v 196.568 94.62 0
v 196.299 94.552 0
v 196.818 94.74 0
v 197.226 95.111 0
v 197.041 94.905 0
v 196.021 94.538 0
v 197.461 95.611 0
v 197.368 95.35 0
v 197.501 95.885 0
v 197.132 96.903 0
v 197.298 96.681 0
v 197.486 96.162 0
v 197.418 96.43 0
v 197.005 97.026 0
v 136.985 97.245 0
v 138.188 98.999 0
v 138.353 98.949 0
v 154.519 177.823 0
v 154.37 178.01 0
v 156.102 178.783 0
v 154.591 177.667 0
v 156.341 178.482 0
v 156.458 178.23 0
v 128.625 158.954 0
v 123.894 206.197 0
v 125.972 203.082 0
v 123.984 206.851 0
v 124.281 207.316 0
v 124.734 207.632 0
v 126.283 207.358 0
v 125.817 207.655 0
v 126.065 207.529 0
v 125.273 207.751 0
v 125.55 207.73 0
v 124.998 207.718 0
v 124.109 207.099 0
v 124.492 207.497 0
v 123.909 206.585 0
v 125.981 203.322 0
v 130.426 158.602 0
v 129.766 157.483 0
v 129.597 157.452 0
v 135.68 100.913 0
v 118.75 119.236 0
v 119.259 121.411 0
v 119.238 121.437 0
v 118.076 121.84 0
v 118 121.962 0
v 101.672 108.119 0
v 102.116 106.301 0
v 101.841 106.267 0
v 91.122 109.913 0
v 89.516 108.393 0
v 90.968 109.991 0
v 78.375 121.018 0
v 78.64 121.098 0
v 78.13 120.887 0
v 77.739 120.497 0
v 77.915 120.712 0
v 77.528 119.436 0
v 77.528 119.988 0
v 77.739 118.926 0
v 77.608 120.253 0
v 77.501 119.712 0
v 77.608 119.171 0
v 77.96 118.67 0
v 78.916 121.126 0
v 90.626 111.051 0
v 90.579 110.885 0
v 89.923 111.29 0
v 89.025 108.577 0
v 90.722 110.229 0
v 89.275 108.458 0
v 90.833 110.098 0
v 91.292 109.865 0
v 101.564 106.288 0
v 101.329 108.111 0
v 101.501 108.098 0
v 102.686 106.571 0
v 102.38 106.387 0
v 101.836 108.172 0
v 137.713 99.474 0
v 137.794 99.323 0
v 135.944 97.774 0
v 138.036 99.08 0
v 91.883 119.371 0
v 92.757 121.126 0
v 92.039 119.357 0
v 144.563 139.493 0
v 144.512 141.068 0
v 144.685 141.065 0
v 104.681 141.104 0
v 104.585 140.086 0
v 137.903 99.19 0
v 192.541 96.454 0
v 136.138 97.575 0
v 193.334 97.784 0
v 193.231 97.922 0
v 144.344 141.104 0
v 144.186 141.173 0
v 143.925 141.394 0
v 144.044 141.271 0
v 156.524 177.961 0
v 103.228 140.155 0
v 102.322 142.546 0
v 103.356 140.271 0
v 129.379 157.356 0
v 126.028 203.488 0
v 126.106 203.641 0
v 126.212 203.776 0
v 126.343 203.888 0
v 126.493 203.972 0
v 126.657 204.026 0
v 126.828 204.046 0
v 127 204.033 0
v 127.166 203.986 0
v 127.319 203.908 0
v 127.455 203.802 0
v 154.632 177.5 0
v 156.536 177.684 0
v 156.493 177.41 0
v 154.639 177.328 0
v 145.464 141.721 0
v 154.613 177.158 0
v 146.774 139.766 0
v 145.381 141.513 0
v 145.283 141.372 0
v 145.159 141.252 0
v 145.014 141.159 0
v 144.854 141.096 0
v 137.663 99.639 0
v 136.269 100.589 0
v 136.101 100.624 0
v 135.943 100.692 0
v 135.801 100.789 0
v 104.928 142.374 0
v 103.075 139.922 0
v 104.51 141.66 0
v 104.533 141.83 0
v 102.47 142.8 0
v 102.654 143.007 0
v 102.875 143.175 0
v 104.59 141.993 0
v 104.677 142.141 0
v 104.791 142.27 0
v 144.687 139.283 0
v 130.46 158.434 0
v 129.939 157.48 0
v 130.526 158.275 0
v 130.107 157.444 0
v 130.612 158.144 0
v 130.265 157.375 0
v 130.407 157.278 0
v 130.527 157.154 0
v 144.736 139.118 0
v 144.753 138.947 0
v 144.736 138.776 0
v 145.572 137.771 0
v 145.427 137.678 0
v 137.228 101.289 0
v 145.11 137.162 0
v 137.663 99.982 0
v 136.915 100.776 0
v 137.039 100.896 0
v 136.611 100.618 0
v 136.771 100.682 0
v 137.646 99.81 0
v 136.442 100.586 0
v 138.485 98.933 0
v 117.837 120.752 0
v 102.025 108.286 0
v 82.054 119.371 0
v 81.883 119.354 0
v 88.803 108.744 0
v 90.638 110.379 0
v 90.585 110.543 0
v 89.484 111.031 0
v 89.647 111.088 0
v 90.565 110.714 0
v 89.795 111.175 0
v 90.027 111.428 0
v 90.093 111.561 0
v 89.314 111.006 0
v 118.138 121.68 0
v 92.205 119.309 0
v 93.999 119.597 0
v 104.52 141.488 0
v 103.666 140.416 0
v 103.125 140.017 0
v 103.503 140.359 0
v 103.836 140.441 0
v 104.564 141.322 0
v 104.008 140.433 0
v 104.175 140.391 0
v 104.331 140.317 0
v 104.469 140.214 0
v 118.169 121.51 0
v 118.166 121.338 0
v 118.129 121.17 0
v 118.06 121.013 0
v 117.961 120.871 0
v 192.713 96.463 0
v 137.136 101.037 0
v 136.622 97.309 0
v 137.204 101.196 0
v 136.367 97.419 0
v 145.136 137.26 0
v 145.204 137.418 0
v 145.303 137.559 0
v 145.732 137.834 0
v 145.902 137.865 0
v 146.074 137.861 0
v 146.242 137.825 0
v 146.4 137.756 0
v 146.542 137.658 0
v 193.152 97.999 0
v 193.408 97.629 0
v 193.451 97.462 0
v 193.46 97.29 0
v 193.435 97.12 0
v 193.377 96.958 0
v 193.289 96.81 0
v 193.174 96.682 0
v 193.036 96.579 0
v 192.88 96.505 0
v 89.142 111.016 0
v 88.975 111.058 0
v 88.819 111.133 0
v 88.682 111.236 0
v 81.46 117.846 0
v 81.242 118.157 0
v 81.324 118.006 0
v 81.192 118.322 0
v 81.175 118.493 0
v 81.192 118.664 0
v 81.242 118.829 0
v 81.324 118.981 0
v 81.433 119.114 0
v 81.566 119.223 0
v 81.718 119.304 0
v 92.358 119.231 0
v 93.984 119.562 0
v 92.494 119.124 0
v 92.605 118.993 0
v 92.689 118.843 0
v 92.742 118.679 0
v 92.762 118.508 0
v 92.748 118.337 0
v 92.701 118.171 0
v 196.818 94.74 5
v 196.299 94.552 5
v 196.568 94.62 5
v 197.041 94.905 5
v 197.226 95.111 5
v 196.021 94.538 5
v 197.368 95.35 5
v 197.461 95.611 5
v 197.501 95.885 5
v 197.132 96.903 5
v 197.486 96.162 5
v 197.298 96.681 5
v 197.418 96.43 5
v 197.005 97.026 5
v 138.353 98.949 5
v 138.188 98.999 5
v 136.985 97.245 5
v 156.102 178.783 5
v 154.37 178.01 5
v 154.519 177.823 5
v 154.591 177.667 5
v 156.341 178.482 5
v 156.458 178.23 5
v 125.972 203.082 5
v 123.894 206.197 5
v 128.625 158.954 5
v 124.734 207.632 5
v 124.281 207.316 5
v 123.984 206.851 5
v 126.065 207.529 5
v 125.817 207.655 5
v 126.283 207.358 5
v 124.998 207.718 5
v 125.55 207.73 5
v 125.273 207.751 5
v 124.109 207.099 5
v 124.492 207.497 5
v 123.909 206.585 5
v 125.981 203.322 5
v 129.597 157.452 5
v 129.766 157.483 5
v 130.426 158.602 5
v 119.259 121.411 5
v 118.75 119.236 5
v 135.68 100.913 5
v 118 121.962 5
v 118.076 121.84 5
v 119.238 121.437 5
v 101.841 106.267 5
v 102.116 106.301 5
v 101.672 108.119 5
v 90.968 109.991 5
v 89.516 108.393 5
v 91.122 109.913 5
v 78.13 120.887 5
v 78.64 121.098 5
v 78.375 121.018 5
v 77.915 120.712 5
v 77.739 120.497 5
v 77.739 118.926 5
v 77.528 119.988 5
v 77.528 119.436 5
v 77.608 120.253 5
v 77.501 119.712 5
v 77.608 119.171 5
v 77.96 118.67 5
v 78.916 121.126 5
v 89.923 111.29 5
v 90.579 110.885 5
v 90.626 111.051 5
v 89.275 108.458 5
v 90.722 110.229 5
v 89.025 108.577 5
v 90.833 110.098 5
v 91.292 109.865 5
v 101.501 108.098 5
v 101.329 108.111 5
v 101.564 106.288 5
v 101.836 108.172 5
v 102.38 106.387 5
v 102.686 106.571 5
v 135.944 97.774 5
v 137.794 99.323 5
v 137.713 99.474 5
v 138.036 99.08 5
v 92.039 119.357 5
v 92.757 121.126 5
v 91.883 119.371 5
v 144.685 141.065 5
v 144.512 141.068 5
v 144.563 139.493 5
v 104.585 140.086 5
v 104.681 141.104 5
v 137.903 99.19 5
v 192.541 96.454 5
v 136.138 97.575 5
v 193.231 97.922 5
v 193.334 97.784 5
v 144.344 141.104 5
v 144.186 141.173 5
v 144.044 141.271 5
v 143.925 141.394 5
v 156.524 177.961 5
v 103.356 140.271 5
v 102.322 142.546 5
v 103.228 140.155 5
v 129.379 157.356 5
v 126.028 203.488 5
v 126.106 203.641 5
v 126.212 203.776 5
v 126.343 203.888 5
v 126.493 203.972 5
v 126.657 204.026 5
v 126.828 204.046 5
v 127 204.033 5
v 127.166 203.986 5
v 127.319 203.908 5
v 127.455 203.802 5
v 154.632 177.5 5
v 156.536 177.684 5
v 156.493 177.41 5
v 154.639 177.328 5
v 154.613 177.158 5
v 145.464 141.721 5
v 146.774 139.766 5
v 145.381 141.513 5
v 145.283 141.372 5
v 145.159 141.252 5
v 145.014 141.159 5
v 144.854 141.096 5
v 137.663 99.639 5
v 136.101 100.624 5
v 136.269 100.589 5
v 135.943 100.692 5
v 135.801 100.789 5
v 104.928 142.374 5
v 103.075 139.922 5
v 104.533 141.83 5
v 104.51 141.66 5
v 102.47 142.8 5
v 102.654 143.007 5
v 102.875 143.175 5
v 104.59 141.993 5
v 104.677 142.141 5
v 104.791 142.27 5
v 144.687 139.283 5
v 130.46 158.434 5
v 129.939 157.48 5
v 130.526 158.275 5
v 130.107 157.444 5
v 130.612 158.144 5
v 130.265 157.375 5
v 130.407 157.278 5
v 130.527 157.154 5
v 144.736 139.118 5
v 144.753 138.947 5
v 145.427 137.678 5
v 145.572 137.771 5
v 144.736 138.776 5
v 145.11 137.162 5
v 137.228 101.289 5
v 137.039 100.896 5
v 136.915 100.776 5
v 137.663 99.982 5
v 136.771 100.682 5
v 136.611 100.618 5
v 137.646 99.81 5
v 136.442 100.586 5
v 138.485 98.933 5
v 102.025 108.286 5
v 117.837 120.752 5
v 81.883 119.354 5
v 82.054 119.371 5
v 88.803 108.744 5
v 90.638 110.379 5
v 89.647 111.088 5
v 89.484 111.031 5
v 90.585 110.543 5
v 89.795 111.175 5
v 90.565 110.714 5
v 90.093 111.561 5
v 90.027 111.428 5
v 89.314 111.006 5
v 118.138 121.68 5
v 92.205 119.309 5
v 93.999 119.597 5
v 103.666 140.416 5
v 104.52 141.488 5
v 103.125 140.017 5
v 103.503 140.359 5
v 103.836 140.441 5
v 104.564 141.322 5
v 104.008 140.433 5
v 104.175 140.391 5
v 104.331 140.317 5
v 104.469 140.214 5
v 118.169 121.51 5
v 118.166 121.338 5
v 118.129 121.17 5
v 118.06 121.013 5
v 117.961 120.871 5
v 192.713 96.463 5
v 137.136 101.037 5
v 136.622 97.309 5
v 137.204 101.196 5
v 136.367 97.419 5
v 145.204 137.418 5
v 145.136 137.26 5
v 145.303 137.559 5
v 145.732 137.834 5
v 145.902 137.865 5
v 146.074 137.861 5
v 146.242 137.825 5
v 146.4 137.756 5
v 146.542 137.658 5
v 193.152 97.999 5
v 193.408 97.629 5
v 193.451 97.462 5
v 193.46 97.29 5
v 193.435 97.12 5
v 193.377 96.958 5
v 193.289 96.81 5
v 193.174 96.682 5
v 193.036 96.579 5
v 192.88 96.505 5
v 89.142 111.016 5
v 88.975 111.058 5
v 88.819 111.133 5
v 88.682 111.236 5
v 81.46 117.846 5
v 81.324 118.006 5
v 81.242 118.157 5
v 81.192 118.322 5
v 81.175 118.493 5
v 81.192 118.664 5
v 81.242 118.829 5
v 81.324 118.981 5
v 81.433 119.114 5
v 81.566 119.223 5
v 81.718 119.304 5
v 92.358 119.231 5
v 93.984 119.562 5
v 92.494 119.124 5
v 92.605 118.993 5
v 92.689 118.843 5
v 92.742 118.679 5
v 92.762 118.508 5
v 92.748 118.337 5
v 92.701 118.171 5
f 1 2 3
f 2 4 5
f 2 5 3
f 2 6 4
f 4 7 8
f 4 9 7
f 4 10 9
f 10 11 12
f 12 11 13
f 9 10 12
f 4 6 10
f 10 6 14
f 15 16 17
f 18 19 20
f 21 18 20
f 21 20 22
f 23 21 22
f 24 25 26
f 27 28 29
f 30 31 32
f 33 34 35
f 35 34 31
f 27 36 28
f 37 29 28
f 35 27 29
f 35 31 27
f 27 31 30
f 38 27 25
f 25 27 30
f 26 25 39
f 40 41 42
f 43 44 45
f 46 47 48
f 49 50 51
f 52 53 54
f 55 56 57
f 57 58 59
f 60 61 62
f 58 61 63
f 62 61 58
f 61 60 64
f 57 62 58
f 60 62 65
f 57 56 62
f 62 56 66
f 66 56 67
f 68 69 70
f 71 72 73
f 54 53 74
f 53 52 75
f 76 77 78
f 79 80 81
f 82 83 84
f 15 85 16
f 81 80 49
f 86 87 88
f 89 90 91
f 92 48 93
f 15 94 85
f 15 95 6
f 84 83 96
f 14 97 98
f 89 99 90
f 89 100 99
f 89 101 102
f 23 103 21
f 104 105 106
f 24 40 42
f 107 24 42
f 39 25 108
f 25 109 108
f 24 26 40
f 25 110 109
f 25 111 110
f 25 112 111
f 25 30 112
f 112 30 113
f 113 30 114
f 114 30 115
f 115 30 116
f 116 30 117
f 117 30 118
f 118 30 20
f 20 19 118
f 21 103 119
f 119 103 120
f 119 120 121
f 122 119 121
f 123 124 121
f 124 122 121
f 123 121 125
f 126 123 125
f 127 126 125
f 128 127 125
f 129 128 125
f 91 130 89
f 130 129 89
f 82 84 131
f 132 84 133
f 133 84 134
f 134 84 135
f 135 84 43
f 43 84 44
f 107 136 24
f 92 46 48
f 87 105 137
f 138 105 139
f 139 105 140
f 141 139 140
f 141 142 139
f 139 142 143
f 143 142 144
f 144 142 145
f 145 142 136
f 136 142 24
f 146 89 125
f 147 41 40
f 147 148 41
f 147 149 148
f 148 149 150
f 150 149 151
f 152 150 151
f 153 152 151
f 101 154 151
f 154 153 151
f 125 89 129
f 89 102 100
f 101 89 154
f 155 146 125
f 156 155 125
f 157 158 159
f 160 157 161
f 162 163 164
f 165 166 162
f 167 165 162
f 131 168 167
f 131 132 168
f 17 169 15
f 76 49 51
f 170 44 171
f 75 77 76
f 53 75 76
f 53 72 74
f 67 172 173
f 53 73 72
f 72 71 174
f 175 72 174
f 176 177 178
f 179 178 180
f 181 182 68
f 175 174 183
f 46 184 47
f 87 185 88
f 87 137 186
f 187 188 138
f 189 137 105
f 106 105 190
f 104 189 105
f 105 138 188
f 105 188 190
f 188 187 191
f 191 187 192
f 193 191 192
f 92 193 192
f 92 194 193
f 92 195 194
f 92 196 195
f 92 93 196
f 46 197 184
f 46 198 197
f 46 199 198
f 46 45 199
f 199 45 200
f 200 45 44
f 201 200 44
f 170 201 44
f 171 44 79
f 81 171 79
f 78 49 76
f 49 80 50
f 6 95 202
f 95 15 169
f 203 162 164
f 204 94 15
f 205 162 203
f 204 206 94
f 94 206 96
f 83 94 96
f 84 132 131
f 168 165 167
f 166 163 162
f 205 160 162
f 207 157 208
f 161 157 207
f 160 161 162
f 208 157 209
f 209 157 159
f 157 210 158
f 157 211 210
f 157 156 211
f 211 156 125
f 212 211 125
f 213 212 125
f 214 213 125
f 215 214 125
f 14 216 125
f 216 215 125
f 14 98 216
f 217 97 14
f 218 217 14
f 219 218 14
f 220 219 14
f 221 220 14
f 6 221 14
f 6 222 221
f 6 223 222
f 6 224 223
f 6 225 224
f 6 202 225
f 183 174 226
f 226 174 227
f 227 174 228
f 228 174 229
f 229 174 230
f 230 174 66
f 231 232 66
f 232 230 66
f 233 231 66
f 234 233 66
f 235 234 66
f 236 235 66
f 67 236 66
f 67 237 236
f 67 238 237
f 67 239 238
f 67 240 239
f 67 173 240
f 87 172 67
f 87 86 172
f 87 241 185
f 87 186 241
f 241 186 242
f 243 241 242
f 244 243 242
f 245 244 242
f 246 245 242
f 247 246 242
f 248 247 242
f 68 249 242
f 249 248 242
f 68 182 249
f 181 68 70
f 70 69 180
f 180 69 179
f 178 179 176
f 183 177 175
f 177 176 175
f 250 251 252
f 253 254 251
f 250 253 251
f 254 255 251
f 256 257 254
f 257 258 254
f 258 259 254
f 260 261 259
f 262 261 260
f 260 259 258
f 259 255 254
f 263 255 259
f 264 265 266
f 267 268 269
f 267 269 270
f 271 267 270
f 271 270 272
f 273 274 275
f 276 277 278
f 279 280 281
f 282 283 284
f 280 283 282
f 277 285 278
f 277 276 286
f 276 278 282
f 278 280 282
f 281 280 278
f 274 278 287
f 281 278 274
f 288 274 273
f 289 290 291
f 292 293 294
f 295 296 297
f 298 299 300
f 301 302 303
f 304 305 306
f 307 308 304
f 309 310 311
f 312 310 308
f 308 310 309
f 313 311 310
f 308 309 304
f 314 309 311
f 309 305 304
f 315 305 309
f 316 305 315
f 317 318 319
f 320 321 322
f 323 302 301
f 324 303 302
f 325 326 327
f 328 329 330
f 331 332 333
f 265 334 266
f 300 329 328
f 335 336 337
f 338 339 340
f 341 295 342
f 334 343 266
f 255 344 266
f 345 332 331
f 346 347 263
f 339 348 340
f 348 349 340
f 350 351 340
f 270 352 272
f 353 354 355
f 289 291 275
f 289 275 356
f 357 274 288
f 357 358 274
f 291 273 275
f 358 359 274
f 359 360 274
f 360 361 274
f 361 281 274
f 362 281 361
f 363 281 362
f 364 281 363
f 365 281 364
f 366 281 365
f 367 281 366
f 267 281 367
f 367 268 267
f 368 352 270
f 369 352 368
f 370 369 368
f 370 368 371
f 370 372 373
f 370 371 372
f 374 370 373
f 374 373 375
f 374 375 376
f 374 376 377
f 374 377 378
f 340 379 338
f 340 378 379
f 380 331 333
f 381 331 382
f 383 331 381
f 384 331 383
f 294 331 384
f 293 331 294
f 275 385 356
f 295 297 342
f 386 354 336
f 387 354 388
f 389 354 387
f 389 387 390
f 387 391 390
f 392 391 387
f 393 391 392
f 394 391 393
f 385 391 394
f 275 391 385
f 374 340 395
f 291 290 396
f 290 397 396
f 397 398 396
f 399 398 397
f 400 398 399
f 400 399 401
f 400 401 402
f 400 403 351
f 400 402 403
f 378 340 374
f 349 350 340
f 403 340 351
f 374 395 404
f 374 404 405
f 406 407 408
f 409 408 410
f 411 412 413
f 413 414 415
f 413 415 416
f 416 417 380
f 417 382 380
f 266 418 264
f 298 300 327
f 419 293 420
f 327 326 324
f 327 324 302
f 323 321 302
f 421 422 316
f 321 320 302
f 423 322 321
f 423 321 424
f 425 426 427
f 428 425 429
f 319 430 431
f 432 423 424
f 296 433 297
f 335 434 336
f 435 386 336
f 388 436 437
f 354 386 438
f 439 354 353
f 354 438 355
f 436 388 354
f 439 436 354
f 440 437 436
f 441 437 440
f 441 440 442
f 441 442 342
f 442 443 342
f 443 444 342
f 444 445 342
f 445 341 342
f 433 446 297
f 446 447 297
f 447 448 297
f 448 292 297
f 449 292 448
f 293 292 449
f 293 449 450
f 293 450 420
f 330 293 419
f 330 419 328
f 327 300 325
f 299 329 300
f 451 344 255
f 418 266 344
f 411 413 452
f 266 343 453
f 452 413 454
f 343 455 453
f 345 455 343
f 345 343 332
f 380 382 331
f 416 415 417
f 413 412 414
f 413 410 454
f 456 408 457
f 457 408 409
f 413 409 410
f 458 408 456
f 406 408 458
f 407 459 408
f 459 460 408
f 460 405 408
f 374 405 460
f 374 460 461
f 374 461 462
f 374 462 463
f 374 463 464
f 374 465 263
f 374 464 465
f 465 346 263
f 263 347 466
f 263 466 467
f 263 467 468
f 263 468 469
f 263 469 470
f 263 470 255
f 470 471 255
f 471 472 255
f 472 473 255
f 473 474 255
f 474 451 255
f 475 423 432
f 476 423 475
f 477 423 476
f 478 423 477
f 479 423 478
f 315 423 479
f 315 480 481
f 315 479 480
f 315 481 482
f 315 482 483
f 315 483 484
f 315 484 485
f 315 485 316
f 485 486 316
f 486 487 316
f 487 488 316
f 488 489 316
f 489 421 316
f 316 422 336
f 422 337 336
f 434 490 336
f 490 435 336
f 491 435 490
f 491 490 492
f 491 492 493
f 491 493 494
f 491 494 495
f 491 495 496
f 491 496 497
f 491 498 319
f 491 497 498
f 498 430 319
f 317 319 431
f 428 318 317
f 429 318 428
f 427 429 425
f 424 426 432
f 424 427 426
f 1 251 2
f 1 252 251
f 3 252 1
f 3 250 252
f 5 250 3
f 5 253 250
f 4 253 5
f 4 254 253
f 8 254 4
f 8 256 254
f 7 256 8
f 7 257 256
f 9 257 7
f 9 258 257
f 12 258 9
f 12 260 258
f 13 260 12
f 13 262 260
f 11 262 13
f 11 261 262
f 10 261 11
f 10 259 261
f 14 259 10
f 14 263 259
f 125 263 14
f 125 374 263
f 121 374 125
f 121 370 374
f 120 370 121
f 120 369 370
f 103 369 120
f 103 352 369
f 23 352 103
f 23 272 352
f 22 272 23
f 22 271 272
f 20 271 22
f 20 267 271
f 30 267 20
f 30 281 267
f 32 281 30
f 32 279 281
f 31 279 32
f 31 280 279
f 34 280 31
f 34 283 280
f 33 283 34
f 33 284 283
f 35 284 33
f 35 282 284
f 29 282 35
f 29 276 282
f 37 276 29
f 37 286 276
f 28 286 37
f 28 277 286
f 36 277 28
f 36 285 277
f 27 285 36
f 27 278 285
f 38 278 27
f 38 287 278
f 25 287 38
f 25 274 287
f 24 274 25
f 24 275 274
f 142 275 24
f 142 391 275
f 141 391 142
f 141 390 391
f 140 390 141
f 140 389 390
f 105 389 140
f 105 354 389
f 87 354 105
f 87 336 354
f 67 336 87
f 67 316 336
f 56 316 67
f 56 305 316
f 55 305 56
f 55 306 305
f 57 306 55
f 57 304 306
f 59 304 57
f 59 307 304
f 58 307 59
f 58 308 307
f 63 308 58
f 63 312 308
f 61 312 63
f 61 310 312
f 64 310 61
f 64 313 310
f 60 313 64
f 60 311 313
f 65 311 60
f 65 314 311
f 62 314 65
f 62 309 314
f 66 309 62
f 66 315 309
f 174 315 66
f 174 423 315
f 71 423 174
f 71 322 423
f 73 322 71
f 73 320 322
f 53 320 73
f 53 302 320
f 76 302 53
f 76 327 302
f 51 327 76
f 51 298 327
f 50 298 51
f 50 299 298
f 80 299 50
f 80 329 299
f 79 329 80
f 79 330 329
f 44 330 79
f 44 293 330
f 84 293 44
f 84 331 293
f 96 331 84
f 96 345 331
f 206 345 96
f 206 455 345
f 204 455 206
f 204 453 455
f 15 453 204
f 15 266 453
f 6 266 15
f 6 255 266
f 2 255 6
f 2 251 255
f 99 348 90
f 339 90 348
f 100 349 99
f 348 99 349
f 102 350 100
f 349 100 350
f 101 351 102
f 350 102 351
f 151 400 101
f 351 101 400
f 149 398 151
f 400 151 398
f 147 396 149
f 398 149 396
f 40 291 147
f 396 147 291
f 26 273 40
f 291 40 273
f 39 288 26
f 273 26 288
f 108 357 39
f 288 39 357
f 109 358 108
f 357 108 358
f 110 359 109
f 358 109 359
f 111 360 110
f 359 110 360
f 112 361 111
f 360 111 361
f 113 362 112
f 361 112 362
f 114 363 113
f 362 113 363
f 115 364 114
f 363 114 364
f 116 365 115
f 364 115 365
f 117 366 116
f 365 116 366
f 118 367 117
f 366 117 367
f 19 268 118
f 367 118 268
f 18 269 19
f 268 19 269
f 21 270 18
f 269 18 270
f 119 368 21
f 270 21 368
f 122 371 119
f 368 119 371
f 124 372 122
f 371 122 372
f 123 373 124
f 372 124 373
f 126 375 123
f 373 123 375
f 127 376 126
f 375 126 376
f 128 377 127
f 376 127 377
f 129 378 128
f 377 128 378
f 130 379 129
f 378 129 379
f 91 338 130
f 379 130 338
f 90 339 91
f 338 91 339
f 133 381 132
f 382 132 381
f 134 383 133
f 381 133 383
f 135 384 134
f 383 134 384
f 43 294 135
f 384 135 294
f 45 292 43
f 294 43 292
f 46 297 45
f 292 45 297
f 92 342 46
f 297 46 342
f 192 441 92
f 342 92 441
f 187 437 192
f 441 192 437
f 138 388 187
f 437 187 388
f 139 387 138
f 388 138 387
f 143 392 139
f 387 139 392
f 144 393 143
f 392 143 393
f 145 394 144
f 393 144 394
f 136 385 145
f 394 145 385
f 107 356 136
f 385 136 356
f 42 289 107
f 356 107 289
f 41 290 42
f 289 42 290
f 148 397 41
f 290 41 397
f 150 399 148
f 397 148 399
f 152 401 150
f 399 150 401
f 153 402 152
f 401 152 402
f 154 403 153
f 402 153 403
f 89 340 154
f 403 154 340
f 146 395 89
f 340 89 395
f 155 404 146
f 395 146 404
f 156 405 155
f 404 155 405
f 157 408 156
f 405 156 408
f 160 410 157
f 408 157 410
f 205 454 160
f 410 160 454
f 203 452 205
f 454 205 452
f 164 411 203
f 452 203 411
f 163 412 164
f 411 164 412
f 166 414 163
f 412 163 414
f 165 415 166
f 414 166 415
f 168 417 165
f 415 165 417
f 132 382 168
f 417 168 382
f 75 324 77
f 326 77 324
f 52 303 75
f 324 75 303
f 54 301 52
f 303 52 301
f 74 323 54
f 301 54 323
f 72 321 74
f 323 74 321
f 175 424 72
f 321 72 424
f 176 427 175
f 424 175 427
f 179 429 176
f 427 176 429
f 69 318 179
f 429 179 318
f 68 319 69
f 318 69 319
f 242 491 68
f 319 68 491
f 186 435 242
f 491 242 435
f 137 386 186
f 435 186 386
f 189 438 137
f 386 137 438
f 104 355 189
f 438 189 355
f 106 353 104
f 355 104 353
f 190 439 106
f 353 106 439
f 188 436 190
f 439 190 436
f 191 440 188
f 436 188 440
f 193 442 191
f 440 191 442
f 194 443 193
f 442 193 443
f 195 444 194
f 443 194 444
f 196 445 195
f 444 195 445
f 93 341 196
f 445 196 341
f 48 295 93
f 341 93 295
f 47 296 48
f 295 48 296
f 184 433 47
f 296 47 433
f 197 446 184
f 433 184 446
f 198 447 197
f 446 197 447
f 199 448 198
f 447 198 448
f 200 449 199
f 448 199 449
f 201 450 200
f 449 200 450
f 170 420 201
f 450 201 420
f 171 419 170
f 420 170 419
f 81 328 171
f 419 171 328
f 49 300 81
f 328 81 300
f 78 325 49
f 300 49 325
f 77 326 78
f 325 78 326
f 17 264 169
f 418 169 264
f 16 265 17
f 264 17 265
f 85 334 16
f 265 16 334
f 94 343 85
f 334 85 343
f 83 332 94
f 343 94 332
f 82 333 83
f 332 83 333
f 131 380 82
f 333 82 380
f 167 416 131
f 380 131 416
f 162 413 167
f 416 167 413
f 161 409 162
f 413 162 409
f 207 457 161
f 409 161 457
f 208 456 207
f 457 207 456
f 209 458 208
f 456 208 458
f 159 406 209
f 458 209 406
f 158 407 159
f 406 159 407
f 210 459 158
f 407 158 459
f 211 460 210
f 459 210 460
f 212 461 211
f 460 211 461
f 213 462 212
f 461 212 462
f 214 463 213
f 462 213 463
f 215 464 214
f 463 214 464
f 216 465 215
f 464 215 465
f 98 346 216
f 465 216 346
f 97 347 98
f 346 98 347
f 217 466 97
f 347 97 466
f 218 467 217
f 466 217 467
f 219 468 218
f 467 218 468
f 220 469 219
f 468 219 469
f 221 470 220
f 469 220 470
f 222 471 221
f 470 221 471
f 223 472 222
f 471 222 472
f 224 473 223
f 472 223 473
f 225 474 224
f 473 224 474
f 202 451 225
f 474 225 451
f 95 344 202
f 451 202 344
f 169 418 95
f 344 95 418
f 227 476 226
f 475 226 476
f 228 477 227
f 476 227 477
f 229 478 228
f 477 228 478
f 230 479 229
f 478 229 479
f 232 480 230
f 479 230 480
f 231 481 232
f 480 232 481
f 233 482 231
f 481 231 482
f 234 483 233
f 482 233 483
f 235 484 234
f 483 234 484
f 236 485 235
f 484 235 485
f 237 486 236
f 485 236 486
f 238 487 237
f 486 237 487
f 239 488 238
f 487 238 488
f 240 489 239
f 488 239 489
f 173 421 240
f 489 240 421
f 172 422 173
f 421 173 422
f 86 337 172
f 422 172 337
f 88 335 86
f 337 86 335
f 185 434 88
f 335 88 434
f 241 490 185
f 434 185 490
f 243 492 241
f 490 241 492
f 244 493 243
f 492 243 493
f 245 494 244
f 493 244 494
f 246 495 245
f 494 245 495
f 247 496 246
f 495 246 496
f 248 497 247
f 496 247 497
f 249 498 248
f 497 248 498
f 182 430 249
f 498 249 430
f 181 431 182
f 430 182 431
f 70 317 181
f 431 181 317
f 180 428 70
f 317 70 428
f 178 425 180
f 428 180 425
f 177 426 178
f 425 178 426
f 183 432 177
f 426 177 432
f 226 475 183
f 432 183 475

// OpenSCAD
/*
 * Customizable Origami - Dove - https://www.thingiverse.com/thing:2651960
 * by Dennis Hofmann - https://www.thingiverse.com/mightynozzle/about
 * created 2017-11-17
 * version v1.0
 *
 * Changelog
 * --------------
 * v1.0:
 *      - final design
 * --------------
 * 
 * This work is licensed under the Creative Commons - Attribution - NonCommercial - ShareAlike license.
 * https://creativecommons.org/licenses/by-nc-sa/3.0/
 */


 // Parameter Section //
//-------------------//

// preview[view:north, tilt:top]

// The maximum size of the longest side. The shorter side will be automatically resized in same ratio.
max_size_in_millimeter = 120; //[20:300]

// The height of the model.
model_height_in_millimeter = 5; //[0.2:0.2:100]

// Thickness of the outer outline.
outline_size_in_millimeter = 1.8; //[0.5:0.1:20]

// Thickness of the inner outline.
inline_size_in_millimeter = 0.7; //[0.5:0.1:20]

// Roundiness of the ends of the inner outlines.
inline_edge_radius_in_millimeter = 0.9; //[0.0:0.1:5]

// Flip model
flip_model = "no"; //[yes,no]

/*[hidden]*/
max_size = max_size_in_millimeter;
model_height = model_height_in_millimeter;
$fn=32;

// Outer Points
A1 = [262, 398];
A2 = [298, 365];
A3 = [338, 358];
A4 = [395, 403];
A5 = [455, 328];
A6 = [651, 319];
A7 = [482, 463];
A8 = [515, 591];
A9 = [416, 686];
A10 = [432, 526];
A11 = [344, 472];
A12 = [311, 398];

outline = [A1, A2, A3, A4, A5, A6, A7, A8, A9, A10, A11, A12];

// Inner Points

// Polygons
C1 = [A1, A2, A12];
C2 = [A3, A4, A11, A12, A2];
C3 = [A4, A5, A7, A10, A11];
C4 = [A5, A6, A7];
C5 = [A7, A8, A9, A10];

cut_polygons = [C1, C2, C3, C4, C5];

min_x = A1[0];
min_y = A6[1];
max_x = A6[0];
max_y = A9[1];

x_size = max_x - min_x;
y_size = max_y - min_y;

x_factor = max_size / x_size;
y_factor = max_size / y_size;

inline_size = x_size > y_size ? inline_size_in_millimeter / x_factor / 2: inline_size_in_millimeter / y_factor / 2;
inline_edge_radius = x_size > y_size ? inline_edge_radius_in_millimeter / x_factor: inline_edge_radius_in_millimeter / y_factor;
outline_size = x_size > y_size ? outline_size_in_millimeter / x_factor - inline_size: outline_size_in_millimeter / y_factor - inline_size;


 // Program Section //
//-----------------//

if(x_size > y_size) {
    resize(newsize=[max_size, x_factor * y_size, model_height]){
        if(flip_model == "yes") {
            mirror([0,1,0]) {
                rotate([180,180,0]) {    
                    create(outline, cut_polygons);
                }
            }
        } else {
            create(outline, cut_polygons);
        }
    }
} else {
    resize(newsize=[y_factor * x_size, max_size, model_height]){
        if(flip_model == "yes") {
            mirror([0,1,0]) {
                rotate([180,180,0]) {    
                    create(outline, cut_polygons);
                }
            }
        } else {
            create(outline, cut_polygons);
        }
    }
}


 // Module Section //
//----------------//

module create() {
    linear_extrude(height=1) {
        difference() {
            offset(r = -0) {
                offset(r = +outline_size) {
                    polygon(points = outline, convexity = 10);
                }
            }
            
            for(cut_polygon = [0:len(cut_polygons)]) {
                offset(r = +inline_edge_radius) {
                    offset(r = -inline_size - inline_edge_radius) {
                        polygon(points = cut_polygons[cut_polygon], convexity = 10);
                    }
                }
            }
        }
    }
}
